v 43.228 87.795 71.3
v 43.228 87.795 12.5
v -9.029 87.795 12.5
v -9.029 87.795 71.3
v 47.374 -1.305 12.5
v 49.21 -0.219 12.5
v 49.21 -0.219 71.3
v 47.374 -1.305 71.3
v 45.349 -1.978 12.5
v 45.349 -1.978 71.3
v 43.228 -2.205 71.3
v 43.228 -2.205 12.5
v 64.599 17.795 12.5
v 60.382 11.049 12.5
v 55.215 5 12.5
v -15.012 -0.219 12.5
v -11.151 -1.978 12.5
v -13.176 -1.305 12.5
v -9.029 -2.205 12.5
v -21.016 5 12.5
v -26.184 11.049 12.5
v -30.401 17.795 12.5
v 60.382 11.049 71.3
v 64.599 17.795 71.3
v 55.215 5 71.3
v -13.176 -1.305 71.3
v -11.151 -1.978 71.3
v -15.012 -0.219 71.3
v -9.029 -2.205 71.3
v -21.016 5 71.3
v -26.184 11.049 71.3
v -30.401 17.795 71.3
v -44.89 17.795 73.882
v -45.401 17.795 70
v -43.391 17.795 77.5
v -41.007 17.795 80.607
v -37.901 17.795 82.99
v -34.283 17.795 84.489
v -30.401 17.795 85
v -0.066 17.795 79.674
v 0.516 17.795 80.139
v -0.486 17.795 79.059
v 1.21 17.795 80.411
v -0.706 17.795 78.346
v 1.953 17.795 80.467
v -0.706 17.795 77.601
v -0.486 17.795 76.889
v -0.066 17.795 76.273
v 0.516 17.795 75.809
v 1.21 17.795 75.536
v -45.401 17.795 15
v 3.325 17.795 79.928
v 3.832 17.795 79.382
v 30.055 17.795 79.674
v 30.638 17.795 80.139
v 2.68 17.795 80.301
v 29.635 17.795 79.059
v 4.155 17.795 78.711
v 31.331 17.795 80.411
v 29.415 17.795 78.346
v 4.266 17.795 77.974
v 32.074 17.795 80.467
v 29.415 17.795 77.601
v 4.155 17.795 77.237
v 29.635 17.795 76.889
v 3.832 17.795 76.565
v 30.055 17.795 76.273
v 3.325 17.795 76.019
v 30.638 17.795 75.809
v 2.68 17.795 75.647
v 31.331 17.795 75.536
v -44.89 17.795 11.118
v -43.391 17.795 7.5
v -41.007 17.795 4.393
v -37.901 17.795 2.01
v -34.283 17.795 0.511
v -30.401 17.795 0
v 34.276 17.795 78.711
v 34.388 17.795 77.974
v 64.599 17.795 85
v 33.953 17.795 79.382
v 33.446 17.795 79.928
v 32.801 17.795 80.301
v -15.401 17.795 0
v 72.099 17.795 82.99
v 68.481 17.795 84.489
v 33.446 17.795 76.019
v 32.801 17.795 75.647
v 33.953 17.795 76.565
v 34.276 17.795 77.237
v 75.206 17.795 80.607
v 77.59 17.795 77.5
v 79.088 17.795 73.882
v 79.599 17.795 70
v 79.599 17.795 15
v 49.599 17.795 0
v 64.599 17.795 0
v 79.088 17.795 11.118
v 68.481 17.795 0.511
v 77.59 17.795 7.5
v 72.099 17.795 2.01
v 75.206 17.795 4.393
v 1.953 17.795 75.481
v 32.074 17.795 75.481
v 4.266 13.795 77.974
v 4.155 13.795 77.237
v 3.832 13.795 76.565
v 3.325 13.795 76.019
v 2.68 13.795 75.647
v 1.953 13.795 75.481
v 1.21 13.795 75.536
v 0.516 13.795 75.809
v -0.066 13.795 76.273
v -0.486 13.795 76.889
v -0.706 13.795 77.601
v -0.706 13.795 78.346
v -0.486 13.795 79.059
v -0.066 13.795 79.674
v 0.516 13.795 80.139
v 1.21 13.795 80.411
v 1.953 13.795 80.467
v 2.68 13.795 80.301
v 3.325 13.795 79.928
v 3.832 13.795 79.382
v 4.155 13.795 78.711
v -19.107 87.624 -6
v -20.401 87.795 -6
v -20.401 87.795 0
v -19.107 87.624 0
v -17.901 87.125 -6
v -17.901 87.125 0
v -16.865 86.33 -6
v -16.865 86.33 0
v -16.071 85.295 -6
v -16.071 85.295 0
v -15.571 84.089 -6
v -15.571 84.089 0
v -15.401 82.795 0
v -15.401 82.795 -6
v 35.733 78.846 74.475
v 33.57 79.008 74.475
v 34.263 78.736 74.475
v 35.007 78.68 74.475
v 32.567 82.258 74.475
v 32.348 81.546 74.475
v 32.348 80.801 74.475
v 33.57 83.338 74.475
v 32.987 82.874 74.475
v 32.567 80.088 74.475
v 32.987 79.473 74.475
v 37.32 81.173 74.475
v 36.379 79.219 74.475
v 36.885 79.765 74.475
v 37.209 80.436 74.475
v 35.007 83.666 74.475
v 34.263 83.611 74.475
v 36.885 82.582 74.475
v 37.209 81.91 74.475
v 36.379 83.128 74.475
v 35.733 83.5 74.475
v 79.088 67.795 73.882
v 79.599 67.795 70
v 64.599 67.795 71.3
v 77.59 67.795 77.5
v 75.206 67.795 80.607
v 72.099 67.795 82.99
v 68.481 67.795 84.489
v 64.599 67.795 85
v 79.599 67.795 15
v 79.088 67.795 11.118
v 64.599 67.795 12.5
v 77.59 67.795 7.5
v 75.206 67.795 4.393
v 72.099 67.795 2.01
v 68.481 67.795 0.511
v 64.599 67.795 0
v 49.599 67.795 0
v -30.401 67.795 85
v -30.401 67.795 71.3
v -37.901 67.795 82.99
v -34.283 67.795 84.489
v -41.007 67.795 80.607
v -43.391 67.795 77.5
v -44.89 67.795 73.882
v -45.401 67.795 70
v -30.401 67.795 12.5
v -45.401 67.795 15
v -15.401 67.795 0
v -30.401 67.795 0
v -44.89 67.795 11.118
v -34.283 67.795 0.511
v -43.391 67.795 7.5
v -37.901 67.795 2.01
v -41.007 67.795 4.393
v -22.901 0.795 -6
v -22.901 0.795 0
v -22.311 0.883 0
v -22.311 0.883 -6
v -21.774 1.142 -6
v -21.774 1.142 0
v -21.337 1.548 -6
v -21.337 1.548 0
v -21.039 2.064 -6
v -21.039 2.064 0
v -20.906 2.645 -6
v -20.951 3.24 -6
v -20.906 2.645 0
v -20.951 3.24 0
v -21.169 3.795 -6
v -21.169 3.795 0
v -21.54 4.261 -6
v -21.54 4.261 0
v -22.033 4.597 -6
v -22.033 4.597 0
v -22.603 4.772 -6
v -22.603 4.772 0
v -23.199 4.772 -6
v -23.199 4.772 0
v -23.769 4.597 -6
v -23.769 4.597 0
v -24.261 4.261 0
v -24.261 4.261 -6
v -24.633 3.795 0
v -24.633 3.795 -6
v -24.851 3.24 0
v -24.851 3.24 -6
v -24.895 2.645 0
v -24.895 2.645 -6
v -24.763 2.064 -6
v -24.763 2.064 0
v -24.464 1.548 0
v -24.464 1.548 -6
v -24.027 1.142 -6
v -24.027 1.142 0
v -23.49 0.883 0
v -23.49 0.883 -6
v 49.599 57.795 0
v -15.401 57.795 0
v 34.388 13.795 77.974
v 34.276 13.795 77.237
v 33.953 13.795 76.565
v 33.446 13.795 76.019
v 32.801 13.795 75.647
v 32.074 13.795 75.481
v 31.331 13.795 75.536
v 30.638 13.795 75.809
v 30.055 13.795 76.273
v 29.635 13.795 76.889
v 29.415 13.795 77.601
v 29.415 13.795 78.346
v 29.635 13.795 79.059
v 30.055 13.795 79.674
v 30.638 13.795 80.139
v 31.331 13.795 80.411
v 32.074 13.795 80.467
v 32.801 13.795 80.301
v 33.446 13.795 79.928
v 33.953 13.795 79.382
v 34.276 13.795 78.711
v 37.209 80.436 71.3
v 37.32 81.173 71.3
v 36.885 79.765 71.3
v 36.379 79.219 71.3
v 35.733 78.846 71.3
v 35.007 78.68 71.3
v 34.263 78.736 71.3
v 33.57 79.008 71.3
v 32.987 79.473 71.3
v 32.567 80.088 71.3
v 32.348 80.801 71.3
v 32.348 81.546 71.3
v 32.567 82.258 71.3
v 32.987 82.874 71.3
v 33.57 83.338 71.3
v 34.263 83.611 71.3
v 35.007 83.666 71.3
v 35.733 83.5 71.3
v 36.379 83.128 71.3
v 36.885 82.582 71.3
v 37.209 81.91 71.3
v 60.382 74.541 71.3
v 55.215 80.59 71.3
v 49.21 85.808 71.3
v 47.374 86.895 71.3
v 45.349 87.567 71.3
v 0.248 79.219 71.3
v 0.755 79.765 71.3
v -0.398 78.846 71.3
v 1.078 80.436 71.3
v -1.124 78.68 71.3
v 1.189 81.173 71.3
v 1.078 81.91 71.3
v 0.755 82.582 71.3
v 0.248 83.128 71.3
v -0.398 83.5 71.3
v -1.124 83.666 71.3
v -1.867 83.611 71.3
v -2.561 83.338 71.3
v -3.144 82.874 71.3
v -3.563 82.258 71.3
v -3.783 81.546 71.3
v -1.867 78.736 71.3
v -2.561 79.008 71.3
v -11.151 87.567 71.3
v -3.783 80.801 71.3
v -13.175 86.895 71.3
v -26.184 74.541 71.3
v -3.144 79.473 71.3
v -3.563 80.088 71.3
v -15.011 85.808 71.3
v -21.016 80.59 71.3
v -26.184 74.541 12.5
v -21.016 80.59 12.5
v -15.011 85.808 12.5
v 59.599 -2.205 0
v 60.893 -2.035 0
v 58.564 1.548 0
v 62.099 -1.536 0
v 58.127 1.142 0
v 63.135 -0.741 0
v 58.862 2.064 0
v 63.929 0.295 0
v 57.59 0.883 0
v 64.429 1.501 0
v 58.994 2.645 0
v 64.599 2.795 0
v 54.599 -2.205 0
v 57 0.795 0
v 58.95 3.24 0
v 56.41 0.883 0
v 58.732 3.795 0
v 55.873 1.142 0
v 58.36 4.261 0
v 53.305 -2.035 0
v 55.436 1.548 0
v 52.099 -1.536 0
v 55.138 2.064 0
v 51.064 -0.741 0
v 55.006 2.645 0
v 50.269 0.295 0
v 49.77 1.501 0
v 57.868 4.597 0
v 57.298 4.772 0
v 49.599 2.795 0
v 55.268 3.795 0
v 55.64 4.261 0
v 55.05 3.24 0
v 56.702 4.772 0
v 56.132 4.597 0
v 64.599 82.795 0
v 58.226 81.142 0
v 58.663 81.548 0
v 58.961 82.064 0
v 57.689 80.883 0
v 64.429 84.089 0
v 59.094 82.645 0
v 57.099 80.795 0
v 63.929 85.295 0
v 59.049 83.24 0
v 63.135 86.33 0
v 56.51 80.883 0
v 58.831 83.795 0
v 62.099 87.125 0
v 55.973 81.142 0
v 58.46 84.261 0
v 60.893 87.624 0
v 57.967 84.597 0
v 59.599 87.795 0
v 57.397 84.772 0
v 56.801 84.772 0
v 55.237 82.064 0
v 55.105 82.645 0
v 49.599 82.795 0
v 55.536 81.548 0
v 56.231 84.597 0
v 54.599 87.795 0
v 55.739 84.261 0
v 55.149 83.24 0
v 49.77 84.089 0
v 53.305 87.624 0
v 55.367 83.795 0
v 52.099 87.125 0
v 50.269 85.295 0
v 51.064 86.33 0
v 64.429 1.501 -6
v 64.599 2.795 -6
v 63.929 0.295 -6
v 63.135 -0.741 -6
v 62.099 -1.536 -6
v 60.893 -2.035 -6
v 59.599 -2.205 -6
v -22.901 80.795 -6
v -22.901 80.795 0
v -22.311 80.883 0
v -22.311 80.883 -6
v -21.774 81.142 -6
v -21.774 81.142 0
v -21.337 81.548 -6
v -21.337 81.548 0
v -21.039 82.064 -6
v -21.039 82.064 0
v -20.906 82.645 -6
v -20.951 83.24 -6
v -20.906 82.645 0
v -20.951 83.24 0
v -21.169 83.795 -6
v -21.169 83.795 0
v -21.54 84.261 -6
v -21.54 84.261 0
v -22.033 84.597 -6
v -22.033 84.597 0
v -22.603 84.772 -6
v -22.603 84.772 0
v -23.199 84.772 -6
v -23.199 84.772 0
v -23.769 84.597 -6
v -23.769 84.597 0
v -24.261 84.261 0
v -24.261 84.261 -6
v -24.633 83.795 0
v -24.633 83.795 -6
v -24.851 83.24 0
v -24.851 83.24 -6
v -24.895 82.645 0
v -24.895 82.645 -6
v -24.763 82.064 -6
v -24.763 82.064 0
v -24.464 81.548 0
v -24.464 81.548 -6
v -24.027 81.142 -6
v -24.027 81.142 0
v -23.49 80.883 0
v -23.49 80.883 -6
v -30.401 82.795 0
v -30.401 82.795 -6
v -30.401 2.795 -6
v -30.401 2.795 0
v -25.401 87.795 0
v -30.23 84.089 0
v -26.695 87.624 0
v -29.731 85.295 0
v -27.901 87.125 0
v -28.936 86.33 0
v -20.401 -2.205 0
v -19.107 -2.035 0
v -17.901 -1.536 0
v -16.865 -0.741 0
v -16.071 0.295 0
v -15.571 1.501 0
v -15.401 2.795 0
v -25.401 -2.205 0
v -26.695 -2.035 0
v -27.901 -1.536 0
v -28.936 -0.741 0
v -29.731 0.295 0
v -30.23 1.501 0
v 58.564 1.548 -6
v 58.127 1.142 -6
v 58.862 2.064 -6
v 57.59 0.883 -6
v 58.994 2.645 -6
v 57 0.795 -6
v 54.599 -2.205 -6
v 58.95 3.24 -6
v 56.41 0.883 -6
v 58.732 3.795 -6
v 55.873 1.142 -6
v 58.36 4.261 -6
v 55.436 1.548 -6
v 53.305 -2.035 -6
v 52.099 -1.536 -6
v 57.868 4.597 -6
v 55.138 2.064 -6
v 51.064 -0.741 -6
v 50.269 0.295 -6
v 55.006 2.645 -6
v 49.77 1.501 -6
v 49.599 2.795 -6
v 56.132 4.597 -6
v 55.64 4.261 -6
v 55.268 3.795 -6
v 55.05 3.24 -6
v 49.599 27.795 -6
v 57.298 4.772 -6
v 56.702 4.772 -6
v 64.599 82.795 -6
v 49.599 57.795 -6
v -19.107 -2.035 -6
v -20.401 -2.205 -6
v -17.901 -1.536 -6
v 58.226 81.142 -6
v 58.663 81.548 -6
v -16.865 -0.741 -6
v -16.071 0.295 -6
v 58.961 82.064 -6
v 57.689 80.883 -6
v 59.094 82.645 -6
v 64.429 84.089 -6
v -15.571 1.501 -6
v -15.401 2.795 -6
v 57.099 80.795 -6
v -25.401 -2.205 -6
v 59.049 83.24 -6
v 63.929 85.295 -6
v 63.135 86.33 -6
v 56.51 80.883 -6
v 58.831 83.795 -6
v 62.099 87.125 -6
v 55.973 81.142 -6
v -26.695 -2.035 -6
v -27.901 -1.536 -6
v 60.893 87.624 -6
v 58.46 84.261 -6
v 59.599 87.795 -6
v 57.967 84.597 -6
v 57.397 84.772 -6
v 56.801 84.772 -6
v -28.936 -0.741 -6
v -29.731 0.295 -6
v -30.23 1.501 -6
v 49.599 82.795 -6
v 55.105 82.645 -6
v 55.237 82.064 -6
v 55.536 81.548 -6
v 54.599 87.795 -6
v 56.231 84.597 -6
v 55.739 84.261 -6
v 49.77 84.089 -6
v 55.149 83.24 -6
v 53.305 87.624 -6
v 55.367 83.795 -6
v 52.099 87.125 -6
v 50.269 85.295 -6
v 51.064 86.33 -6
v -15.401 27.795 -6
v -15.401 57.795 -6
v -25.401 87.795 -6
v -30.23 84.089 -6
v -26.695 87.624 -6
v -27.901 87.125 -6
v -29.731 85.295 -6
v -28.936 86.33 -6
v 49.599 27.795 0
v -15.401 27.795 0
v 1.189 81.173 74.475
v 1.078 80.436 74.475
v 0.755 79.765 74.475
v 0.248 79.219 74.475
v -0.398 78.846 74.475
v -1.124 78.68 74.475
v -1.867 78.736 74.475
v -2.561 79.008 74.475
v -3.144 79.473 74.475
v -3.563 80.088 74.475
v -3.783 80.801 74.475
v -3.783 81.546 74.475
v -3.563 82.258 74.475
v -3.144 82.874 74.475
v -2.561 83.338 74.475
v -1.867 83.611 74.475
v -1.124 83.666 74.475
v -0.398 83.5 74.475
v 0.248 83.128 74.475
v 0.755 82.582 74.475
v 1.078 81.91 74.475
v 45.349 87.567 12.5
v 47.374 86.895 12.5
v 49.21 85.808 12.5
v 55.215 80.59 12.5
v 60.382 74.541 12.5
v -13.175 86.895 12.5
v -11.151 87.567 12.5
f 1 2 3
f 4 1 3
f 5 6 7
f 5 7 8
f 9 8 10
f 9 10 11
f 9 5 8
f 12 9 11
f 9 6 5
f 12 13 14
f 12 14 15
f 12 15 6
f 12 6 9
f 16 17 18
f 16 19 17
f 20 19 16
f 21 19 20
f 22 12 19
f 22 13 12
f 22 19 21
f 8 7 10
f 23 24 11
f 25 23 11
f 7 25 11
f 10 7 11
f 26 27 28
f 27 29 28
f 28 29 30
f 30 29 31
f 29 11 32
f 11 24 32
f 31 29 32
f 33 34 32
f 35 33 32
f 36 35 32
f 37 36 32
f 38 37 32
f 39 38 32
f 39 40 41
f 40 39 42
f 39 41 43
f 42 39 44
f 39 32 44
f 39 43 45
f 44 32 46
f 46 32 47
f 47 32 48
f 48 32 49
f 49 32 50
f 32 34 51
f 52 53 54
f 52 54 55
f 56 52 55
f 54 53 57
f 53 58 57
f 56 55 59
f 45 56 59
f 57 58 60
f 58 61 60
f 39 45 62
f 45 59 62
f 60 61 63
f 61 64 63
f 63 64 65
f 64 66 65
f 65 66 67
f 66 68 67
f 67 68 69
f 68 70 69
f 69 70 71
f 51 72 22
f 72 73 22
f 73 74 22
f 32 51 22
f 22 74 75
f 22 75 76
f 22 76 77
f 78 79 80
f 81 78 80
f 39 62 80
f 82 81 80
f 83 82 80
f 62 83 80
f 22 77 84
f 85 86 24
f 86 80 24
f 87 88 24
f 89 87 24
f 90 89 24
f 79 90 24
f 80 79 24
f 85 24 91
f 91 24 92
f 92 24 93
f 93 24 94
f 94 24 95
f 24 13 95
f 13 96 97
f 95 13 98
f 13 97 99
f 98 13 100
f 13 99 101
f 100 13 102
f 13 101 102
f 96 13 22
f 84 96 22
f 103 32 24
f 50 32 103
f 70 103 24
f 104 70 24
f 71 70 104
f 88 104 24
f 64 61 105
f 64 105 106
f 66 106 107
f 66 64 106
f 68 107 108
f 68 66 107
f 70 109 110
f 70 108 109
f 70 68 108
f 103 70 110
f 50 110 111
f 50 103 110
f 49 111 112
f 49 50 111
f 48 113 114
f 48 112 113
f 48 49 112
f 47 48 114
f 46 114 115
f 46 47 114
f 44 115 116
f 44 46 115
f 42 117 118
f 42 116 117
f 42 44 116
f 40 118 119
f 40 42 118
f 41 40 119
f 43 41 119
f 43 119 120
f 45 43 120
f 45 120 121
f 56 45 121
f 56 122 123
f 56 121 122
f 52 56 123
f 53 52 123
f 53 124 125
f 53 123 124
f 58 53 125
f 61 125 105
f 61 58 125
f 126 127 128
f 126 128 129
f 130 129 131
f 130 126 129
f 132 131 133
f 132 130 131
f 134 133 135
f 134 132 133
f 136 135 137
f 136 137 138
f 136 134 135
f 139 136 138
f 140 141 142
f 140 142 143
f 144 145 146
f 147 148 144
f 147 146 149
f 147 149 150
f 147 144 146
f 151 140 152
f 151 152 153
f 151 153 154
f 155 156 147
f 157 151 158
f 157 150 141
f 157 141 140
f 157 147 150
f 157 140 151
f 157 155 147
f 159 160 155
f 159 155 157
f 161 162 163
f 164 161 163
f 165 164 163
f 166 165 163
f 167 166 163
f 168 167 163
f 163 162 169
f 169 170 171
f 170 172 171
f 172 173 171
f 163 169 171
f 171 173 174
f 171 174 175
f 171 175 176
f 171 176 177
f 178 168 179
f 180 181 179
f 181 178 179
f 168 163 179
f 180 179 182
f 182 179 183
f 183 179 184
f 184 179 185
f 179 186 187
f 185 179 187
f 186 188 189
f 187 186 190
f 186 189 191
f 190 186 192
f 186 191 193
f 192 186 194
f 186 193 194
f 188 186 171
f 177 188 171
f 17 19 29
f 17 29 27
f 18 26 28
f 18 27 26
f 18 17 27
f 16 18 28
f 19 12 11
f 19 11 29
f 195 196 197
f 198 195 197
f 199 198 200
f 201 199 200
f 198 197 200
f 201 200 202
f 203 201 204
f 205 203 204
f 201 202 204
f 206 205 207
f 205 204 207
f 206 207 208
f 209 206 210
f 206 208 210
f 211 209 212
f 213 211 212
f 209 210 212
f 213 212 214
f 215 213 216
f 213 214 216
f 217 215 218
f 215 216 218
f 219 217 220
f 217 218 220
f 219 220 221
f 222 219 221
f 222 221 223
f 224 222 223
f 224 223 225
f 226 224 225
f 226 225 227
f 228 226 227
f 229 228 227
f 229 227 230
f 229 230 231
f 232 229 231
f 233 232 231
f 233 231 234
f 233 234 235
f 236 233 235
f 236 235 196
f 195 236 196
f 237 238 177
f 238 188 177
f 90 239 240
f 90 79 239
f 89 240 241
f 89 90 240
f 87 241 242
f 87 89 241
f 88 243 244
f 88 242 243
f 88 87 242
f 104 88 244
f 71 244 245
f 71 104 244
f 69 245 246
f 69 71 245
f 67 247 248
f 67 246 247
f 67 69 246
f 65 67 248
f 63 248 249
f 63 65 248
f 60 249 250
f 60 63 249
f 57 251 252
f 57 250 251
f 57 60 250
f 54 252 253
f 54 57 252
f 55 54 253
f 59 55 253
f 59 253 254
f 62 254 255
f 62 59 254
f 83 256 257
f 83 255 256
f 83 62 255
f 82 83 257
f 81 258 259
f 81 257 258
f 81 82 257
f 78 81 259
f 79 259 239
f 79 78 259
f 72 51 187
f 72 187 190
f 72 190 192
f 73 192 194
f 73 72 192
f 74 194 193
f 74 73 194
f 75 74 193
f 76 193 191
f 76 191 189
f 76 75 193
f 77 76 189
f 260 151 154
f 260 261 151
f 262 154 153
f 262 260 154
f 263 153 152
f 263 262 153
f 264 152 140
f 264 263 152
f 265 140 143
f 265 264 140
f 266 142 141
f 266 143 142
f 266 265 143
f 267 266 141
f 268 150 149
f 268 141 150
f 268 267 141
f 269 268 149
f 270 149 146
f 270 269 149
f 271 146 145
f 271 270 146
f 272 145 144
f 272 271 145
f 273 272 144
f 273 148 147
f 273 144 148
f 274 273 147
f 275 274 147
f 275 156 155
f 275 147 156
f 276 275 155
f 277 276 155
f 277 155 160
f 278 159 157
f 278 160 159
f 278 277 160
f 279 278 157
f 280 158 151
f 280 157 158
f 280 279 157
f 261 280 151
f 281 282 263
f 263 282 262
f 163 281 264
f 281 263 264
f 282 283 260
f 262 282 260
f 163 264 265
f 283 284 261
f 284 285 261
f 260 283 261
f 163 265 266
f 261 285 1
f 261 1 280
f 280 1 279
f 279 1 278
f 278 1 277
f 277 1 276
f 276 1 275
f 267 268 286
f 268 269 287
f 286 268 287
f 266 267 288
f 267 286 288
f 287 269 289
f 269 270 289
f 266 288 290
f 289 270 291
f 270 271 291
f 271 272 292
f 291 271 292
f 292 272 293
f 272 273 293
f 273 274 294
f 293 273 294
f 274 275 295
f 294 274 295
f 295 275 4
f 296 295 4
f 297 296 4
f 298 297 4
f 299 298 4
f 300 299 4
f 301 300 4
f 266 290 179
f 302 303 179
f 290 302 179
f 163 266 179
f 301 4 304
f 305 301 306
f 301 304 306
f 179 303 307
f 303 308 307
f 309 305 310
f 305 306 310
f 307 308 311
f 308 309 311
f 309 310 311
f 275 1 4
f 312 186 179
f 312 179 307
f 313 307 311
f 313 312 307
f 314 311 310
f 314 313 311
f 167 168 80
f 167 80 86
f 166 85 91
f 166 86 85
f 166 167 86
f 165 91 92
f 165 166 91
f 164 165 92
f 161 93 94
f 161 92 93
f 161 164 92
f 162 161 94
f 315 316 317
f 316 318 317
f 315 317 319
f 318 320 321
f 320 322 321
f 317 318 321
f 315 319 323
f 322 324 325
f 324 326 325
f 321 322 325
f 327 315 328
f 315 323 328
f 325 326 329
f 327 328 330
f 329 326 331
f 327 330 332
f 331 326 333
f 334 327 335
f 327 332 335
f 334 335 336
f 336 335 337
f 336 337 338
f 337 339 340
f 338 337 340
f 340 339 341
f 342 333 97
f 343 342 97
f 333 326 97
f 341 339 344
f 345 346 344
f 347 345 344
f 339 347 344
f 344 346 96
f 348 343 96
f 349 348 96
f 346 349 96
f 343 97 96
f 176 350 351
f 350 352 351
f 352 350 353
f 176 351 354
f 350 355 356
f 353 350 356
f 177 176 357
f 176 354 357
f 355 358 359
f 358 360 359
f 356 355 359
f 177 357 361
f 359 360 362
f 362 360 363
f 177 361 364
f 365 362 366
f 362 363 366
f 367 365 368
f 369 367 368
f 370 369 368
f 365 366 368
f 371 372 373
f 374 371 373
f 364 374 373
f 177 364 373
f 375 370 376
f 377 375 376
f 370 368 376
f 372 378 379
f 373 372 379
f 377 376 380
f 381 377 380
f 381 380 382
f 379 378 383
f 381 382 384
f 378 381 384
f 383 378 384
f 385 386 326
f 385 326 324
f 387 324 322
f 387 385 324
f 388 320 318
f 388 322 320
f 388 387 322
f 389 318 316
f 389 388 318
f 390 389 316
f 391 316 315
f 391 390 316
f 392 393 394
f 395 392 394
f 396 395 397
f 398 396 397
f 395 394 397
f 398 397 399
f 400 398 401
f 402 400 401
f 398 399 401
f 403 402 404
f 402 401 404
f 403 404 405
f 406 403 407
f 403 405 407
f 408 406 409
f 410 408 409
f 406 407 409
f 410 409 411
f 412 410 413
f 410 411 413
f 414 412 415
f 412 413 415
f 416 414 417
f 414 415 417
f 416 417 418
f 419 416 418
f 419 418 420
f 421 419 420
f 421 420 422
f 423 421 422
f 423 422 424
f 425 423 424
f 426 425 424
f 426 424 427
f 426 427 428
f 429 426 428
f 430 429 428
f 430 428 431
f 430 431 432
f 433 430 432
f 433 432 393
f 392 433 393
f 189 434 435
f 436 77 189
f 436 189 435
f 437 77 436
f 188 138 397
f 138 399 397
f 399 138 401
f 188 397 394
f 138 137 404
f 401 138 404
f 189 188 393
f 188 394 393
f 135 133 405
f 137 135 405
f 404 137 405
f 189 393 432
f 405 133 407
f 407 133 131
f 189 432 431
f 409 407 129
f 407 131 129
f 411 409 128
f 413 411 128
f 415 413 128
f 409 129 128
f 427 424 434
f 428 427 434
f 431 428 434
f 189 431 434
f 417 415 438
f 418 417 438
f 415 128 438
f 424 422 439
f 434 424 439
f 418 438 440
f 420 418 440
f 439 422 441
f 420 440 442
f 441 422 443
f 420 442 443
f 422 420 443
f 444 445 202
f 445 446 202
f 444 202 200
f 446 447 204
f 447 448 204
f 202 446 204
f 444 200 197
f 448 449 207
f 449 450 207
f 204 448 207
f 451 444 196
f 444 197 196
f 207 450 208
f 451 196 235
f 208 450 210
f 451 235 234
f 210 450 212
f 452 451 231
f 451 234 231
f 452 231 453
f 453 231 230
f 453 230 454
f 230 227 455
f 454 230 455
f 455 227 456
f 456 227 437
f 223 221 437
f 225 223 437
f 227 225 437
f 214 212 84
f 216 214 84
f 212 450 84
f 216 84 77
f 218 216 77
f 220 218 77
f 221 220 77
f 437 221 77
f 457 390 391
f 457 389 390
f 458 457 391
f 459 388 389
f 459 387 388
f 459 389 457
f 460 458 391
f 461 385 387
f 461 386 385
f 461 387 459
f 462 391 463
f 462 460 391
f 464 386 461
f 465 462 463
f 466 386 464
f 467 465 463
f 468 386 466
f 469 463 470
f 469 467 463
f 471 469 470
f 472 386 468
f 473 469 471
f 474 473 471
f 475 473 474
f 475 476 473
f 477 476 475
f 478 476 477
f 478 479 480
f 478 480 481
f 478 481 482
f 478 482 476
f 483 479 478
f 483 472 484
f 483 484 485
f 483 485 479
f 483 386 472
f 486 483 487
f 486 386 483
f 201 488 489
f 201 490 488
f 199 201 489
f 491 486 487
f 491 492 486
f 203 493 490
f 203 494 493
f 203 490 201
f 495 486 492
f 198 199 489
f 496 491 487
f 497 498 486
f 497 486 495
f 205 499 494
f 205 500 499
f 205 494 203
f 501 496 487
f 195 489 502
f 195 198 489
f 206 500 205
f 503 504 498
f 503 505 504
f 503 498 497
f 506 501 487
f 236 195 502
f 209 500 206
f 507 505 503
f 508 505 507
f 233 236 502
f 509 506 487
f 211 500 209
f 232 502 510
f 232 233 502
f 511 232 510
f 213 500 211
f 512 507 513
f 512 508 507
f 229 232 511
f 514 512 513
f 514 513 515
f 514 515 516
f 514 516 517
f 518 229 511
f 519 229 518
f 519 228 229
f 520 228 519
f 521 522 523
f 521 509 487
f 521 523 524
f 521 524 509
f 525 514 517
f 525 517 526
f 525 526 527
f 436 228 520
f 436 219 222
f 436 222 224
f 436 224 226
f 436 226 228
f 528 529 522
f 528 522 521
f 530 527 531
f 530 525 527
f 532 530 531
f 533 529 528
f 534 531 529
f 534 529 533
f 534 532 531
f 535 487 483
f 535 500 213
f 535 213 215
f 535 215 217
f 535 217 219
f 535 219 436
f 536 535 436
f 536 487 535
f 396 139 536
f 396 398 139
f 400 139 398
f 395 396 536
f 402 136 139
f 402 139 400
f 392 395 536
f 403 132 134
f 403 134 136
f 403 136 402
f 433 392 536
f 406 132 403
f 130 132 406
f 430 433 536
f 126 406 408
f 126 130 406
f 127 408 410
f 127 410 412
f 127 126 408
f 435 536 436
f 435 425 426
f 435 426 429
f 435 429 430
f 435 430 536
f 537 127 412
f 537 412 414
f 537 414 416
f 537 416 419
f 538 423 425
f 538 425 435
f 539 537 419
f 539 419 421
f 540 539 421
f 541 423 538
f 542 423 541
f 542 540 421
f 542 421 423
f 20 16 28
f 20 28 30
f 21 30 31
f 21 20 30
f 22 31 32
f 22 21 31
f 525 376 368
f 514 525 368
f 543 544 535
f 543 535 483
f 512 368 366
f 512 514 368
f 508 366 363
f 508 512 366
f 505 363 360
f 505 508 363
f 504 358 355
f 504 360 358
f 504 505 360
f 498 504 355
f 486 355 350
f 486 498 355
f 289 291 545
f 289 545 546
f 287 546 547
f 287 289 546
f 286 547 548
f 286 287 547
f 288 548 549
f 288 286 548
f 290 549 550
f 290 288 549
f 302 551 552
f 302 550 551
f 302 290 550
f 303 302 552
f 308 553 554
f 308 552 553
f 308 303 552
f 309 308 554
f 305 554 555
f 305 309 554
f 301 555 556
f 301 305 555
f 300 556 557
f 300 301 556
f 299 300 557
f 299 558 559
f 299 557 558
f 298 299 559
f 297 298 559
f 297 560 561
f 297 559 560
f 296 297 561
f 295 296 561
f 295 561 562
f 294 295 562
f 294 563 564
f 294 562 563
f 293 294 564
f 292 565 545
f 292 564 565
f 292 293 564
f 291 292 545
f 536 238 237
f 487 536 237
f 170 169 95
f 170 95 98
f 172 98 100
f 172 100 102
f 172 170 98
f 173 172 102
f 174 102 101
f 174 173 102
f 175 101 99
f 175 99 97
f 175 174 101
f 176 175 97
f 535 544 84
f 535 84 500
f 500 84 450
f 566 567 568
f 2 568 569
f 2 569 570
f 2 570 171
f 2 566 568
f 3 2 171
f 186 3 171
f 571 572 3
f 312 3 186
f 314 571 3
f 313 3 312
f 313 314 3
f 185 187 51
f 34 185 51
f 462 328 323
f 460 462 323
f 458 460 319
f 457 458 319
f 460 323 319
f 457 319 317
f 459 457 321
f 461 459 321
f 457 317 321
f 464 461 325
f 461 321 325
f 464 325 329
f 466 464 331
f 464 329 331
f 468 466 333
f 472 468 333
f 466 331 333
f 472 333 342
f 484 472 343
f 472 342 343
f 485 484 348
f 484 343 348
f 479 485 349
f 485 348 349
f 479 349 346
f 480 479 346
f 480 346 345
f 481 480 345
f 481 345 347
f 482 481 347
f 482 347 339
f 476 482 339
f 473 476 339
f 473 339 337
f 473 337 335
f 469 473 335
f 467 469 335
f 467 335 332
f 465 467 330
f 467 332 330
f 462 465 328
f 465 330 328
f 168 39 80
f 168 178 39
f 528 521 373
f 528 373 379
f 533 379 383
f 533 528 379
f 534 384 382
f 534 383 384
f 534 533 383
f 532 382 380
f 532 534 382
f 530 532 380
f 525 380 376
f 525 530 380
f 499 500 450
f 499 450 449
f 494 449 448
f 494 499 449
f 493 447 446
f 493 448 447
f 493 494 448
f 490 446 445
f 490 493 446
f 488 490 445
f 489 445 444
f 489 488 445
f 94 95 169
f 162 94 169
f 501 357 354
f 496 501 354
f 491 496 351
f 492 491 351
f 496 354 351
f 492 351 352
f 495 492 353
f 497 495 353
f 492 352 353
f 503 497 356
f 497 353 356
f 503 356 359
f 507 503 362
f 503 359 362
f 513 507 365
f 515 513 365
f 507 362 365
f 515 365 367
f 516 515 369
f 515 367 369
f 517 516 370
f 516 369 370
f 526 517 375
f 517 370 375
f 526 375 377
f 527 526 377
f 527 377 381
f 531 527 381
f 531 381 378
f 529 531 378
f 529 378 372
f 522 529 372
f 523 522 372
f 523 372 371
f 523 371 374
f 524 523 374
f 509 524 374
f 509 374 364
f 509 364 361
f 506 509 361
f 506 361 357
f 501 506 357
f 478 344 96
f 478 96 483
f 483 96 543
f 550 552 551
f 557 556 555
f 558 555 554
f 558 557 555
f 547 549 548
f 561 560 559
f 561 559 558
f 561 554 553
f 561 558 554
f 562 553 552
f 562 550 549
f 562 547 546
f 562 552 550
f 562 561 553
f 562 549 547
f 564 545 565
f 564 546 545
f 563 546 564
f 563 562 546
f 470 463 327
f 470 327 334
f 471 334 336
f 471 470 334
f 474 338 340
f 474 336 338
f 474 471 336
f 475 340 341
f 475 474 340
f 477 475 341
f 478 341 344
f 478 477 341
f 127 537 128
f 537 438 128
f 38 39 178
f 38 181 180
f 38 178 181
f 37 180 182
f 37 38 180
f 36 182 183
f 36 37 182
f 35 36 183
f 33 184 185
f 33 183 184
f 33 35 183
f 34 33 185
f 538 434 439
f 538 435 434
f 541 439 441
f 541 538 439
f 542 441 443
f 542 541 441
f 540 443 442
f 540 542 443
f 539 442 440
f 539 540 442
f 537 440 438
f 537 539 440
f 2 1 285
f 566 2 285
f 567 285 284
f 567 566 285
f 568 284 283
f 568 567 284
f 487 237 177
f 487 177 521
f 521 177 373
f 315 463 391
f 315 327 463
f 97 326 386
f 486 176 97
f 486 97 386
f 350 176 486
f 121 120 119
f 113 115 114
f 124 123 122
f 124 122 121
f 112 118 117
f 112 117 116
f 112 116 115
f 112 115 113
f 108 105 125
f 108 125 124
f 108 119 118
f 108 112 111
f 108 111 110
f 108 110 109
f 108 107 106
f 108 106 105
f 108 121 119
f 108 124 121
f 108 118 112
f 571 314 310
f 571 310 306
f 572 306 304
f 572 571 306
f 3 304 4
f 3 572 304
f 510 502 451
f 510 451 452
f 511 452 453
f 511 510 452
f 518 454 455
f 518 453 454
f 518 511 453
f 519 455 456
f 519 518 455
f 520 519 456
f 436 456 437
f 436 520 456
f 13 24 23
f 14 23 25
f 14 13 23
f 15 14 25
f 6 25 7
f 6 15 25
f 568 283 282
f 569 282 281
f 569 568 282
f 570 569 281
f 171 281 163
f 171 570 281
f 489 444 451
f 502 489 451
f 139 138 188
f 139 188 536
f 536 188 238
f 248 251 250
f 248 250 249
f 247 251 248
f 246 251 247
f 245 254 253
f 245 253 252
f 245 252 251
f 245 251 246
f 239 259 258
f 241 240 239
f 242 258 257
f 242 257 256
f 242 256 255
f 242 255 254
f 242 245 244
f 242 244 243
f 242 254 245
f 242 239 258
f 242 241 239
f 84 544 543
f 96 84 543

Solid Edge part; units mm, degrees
sketch "Sketch1" plane through (0, 0, 0) normal (0, 0, 1) x (1, 0, 0)
  line L0 (-45.4008, 17.7946) -> (79.5992, 17.7946)
  line L1 (79.5992, 17.7946) -> (79.5992, 67.7946)
  line L2 (79.5992, 67.7946) -> (-45.4008, 67.7946)
  line L3 (-45.4008, 67.7946) -> (-45.4008, 17.7946)
extrude "Protrusion1" add sketch "Sketch1" along normal blind 85
fillet "Round_1" radius 15 4 edges at (79.5992, 42.7946, 85) (-45.4008, 42.7946, 85) (-45.4008, 42.7946, 0) (79.5992, 42.7946, 0)
sketch "Sketch2" plane through (0, 0, 12.5) normal (0, 0, 1) x (1, 0, 0)
  line L0 (64.5992, 67.7946) -> (-30.4008, 67.7946)
  arc A0 (-30.4008, 67.7946) -> (64.5992, 67.7946) centre (17.0992, 42.7946) cw
  line L1 (-30.4008, 17.7946) -> (64.5992, 17.7946)
  arc A1 (64.5992, 17.7946) -> (-30.4008, 17.7946) centre (17.0992, 42.7946) cw
  dimension "D1" = 95
extrude "ExtrudedProtrusion_2" add sketch "Sketch2" along normal blind 58.8
sketch "Sketch3" plane through (17.0992, 82.1333, 71.3) normal (0, 0, 1) x (-1, 0, 0)
  line L0 (-62.5, -5.6614) -> (69.2147, -5.6614)
extrude "Cutout1" cut sketch "Sketch3" against normal through all material side at (13.7418, 87.8447, 71.3)
sketch "Sketch4" plane through (17.0992, 3.456, 71.3) normal (0, 0, 1) x (-1, 0, 0)
  line L0 (-65.9867, 5.6614) -> (63.9181, 5.6614)
extrude "Cutout2" cut sketch "Sketch4" against normal through all material side at (18.1335, -2.2554, 71.3)
fillet "Round_2" radius 10 4 edges at (46.361, 87.7946, 41.9) (-12.1625, 87.7946, 41.9) (-12.1625, -2.2054, 41.9) (46.361, -2.2054, 41.9)
sketch "Sketch5" plane through (17.0992, 42.7946, 0) normal (0, 0, -1) x (-1, 0, 0)
  line L0 (-32.5, 45) -> (-47.5, 45)
  line L1 (-47.5, -45) -> (-47.5, 45)
  line L2 (-32.5, -45) -> (-47.5, -45)
  line L3 (-32.5, -45) -> (-32.5, -15)
  line L4 (32.5, -15) -> (-32.5, -15)
  line L5 (32.5, -15) -> (32.5, -45)
  line L6 (32.5, -45) -> (47.5, -45)
  line L7 (47.5, 45) -> (47.5, -45)
  line L8 (47.5, 45) -> (32.5, 45)
  line L9 (32.5, 45) -> (32.5, 15)
  line L10 (32.5, 15) -> (-32.5, 15)
  line L11 (-32.5, 15) -> (-32.5, 45)
  dimension "D1" = 15
  dimension "D2" = 15
extrude "ExtrudedProtrusion_3" add sketch "Sketch5" along normal blind 6
fillet "Round_3" radius 5 8 edges at (64.5992, -2.2054, -3) (49.5992, -2.2054, -3) (-15.4008, -2.2054, -3) (-30.4008, -2.2054, -3) (64.5992, 87.7946, -3) (49.5992, 87.7946, -3) (-30.4008, 87.7946, -3) (-15.4008, 87.7946, -3)
sketch "Sketch6" plane through (57.0992, 77.7946, 0) normal (0, 0, 1) x (0, -1, 0)
  circle A0 centre (-5, 0) radius 2
  circle A1 centre (75, -0.0992) radius 2
  circle A2 centre (-5, -80) radius 2
  circle A3 centre (75, -80) radius 2
extrude "Cutout3" cut sketch "Sketch6" against normal through all
sketch "Sketch7" plane through (17.0992, 17.7946, 42.5) normal (0, -1, 0) x (1, 0, 0)
  circle A0 centre (-15.3327, 35.4738) radius 2.5
  circle A1 centre (14.7883, 35.4738) radius 2.5
extrude "ExtrudedProtrusion_4" add sketch "Sketch7" along normal blind 4
sketch "Sketch8" plane through (17.0992, 77.7946, 71.3) normal (0, 0, 1) x (1, 0, 0)
  circle A0 centre (-18.4101, 3.3786) radius 2.5
  circle A1 centre (17.7206, 3.3786) radius 2.5
extrude "ExtrudedProtrusion_5" add sketch "Sketch8" along normal blind 3.175
